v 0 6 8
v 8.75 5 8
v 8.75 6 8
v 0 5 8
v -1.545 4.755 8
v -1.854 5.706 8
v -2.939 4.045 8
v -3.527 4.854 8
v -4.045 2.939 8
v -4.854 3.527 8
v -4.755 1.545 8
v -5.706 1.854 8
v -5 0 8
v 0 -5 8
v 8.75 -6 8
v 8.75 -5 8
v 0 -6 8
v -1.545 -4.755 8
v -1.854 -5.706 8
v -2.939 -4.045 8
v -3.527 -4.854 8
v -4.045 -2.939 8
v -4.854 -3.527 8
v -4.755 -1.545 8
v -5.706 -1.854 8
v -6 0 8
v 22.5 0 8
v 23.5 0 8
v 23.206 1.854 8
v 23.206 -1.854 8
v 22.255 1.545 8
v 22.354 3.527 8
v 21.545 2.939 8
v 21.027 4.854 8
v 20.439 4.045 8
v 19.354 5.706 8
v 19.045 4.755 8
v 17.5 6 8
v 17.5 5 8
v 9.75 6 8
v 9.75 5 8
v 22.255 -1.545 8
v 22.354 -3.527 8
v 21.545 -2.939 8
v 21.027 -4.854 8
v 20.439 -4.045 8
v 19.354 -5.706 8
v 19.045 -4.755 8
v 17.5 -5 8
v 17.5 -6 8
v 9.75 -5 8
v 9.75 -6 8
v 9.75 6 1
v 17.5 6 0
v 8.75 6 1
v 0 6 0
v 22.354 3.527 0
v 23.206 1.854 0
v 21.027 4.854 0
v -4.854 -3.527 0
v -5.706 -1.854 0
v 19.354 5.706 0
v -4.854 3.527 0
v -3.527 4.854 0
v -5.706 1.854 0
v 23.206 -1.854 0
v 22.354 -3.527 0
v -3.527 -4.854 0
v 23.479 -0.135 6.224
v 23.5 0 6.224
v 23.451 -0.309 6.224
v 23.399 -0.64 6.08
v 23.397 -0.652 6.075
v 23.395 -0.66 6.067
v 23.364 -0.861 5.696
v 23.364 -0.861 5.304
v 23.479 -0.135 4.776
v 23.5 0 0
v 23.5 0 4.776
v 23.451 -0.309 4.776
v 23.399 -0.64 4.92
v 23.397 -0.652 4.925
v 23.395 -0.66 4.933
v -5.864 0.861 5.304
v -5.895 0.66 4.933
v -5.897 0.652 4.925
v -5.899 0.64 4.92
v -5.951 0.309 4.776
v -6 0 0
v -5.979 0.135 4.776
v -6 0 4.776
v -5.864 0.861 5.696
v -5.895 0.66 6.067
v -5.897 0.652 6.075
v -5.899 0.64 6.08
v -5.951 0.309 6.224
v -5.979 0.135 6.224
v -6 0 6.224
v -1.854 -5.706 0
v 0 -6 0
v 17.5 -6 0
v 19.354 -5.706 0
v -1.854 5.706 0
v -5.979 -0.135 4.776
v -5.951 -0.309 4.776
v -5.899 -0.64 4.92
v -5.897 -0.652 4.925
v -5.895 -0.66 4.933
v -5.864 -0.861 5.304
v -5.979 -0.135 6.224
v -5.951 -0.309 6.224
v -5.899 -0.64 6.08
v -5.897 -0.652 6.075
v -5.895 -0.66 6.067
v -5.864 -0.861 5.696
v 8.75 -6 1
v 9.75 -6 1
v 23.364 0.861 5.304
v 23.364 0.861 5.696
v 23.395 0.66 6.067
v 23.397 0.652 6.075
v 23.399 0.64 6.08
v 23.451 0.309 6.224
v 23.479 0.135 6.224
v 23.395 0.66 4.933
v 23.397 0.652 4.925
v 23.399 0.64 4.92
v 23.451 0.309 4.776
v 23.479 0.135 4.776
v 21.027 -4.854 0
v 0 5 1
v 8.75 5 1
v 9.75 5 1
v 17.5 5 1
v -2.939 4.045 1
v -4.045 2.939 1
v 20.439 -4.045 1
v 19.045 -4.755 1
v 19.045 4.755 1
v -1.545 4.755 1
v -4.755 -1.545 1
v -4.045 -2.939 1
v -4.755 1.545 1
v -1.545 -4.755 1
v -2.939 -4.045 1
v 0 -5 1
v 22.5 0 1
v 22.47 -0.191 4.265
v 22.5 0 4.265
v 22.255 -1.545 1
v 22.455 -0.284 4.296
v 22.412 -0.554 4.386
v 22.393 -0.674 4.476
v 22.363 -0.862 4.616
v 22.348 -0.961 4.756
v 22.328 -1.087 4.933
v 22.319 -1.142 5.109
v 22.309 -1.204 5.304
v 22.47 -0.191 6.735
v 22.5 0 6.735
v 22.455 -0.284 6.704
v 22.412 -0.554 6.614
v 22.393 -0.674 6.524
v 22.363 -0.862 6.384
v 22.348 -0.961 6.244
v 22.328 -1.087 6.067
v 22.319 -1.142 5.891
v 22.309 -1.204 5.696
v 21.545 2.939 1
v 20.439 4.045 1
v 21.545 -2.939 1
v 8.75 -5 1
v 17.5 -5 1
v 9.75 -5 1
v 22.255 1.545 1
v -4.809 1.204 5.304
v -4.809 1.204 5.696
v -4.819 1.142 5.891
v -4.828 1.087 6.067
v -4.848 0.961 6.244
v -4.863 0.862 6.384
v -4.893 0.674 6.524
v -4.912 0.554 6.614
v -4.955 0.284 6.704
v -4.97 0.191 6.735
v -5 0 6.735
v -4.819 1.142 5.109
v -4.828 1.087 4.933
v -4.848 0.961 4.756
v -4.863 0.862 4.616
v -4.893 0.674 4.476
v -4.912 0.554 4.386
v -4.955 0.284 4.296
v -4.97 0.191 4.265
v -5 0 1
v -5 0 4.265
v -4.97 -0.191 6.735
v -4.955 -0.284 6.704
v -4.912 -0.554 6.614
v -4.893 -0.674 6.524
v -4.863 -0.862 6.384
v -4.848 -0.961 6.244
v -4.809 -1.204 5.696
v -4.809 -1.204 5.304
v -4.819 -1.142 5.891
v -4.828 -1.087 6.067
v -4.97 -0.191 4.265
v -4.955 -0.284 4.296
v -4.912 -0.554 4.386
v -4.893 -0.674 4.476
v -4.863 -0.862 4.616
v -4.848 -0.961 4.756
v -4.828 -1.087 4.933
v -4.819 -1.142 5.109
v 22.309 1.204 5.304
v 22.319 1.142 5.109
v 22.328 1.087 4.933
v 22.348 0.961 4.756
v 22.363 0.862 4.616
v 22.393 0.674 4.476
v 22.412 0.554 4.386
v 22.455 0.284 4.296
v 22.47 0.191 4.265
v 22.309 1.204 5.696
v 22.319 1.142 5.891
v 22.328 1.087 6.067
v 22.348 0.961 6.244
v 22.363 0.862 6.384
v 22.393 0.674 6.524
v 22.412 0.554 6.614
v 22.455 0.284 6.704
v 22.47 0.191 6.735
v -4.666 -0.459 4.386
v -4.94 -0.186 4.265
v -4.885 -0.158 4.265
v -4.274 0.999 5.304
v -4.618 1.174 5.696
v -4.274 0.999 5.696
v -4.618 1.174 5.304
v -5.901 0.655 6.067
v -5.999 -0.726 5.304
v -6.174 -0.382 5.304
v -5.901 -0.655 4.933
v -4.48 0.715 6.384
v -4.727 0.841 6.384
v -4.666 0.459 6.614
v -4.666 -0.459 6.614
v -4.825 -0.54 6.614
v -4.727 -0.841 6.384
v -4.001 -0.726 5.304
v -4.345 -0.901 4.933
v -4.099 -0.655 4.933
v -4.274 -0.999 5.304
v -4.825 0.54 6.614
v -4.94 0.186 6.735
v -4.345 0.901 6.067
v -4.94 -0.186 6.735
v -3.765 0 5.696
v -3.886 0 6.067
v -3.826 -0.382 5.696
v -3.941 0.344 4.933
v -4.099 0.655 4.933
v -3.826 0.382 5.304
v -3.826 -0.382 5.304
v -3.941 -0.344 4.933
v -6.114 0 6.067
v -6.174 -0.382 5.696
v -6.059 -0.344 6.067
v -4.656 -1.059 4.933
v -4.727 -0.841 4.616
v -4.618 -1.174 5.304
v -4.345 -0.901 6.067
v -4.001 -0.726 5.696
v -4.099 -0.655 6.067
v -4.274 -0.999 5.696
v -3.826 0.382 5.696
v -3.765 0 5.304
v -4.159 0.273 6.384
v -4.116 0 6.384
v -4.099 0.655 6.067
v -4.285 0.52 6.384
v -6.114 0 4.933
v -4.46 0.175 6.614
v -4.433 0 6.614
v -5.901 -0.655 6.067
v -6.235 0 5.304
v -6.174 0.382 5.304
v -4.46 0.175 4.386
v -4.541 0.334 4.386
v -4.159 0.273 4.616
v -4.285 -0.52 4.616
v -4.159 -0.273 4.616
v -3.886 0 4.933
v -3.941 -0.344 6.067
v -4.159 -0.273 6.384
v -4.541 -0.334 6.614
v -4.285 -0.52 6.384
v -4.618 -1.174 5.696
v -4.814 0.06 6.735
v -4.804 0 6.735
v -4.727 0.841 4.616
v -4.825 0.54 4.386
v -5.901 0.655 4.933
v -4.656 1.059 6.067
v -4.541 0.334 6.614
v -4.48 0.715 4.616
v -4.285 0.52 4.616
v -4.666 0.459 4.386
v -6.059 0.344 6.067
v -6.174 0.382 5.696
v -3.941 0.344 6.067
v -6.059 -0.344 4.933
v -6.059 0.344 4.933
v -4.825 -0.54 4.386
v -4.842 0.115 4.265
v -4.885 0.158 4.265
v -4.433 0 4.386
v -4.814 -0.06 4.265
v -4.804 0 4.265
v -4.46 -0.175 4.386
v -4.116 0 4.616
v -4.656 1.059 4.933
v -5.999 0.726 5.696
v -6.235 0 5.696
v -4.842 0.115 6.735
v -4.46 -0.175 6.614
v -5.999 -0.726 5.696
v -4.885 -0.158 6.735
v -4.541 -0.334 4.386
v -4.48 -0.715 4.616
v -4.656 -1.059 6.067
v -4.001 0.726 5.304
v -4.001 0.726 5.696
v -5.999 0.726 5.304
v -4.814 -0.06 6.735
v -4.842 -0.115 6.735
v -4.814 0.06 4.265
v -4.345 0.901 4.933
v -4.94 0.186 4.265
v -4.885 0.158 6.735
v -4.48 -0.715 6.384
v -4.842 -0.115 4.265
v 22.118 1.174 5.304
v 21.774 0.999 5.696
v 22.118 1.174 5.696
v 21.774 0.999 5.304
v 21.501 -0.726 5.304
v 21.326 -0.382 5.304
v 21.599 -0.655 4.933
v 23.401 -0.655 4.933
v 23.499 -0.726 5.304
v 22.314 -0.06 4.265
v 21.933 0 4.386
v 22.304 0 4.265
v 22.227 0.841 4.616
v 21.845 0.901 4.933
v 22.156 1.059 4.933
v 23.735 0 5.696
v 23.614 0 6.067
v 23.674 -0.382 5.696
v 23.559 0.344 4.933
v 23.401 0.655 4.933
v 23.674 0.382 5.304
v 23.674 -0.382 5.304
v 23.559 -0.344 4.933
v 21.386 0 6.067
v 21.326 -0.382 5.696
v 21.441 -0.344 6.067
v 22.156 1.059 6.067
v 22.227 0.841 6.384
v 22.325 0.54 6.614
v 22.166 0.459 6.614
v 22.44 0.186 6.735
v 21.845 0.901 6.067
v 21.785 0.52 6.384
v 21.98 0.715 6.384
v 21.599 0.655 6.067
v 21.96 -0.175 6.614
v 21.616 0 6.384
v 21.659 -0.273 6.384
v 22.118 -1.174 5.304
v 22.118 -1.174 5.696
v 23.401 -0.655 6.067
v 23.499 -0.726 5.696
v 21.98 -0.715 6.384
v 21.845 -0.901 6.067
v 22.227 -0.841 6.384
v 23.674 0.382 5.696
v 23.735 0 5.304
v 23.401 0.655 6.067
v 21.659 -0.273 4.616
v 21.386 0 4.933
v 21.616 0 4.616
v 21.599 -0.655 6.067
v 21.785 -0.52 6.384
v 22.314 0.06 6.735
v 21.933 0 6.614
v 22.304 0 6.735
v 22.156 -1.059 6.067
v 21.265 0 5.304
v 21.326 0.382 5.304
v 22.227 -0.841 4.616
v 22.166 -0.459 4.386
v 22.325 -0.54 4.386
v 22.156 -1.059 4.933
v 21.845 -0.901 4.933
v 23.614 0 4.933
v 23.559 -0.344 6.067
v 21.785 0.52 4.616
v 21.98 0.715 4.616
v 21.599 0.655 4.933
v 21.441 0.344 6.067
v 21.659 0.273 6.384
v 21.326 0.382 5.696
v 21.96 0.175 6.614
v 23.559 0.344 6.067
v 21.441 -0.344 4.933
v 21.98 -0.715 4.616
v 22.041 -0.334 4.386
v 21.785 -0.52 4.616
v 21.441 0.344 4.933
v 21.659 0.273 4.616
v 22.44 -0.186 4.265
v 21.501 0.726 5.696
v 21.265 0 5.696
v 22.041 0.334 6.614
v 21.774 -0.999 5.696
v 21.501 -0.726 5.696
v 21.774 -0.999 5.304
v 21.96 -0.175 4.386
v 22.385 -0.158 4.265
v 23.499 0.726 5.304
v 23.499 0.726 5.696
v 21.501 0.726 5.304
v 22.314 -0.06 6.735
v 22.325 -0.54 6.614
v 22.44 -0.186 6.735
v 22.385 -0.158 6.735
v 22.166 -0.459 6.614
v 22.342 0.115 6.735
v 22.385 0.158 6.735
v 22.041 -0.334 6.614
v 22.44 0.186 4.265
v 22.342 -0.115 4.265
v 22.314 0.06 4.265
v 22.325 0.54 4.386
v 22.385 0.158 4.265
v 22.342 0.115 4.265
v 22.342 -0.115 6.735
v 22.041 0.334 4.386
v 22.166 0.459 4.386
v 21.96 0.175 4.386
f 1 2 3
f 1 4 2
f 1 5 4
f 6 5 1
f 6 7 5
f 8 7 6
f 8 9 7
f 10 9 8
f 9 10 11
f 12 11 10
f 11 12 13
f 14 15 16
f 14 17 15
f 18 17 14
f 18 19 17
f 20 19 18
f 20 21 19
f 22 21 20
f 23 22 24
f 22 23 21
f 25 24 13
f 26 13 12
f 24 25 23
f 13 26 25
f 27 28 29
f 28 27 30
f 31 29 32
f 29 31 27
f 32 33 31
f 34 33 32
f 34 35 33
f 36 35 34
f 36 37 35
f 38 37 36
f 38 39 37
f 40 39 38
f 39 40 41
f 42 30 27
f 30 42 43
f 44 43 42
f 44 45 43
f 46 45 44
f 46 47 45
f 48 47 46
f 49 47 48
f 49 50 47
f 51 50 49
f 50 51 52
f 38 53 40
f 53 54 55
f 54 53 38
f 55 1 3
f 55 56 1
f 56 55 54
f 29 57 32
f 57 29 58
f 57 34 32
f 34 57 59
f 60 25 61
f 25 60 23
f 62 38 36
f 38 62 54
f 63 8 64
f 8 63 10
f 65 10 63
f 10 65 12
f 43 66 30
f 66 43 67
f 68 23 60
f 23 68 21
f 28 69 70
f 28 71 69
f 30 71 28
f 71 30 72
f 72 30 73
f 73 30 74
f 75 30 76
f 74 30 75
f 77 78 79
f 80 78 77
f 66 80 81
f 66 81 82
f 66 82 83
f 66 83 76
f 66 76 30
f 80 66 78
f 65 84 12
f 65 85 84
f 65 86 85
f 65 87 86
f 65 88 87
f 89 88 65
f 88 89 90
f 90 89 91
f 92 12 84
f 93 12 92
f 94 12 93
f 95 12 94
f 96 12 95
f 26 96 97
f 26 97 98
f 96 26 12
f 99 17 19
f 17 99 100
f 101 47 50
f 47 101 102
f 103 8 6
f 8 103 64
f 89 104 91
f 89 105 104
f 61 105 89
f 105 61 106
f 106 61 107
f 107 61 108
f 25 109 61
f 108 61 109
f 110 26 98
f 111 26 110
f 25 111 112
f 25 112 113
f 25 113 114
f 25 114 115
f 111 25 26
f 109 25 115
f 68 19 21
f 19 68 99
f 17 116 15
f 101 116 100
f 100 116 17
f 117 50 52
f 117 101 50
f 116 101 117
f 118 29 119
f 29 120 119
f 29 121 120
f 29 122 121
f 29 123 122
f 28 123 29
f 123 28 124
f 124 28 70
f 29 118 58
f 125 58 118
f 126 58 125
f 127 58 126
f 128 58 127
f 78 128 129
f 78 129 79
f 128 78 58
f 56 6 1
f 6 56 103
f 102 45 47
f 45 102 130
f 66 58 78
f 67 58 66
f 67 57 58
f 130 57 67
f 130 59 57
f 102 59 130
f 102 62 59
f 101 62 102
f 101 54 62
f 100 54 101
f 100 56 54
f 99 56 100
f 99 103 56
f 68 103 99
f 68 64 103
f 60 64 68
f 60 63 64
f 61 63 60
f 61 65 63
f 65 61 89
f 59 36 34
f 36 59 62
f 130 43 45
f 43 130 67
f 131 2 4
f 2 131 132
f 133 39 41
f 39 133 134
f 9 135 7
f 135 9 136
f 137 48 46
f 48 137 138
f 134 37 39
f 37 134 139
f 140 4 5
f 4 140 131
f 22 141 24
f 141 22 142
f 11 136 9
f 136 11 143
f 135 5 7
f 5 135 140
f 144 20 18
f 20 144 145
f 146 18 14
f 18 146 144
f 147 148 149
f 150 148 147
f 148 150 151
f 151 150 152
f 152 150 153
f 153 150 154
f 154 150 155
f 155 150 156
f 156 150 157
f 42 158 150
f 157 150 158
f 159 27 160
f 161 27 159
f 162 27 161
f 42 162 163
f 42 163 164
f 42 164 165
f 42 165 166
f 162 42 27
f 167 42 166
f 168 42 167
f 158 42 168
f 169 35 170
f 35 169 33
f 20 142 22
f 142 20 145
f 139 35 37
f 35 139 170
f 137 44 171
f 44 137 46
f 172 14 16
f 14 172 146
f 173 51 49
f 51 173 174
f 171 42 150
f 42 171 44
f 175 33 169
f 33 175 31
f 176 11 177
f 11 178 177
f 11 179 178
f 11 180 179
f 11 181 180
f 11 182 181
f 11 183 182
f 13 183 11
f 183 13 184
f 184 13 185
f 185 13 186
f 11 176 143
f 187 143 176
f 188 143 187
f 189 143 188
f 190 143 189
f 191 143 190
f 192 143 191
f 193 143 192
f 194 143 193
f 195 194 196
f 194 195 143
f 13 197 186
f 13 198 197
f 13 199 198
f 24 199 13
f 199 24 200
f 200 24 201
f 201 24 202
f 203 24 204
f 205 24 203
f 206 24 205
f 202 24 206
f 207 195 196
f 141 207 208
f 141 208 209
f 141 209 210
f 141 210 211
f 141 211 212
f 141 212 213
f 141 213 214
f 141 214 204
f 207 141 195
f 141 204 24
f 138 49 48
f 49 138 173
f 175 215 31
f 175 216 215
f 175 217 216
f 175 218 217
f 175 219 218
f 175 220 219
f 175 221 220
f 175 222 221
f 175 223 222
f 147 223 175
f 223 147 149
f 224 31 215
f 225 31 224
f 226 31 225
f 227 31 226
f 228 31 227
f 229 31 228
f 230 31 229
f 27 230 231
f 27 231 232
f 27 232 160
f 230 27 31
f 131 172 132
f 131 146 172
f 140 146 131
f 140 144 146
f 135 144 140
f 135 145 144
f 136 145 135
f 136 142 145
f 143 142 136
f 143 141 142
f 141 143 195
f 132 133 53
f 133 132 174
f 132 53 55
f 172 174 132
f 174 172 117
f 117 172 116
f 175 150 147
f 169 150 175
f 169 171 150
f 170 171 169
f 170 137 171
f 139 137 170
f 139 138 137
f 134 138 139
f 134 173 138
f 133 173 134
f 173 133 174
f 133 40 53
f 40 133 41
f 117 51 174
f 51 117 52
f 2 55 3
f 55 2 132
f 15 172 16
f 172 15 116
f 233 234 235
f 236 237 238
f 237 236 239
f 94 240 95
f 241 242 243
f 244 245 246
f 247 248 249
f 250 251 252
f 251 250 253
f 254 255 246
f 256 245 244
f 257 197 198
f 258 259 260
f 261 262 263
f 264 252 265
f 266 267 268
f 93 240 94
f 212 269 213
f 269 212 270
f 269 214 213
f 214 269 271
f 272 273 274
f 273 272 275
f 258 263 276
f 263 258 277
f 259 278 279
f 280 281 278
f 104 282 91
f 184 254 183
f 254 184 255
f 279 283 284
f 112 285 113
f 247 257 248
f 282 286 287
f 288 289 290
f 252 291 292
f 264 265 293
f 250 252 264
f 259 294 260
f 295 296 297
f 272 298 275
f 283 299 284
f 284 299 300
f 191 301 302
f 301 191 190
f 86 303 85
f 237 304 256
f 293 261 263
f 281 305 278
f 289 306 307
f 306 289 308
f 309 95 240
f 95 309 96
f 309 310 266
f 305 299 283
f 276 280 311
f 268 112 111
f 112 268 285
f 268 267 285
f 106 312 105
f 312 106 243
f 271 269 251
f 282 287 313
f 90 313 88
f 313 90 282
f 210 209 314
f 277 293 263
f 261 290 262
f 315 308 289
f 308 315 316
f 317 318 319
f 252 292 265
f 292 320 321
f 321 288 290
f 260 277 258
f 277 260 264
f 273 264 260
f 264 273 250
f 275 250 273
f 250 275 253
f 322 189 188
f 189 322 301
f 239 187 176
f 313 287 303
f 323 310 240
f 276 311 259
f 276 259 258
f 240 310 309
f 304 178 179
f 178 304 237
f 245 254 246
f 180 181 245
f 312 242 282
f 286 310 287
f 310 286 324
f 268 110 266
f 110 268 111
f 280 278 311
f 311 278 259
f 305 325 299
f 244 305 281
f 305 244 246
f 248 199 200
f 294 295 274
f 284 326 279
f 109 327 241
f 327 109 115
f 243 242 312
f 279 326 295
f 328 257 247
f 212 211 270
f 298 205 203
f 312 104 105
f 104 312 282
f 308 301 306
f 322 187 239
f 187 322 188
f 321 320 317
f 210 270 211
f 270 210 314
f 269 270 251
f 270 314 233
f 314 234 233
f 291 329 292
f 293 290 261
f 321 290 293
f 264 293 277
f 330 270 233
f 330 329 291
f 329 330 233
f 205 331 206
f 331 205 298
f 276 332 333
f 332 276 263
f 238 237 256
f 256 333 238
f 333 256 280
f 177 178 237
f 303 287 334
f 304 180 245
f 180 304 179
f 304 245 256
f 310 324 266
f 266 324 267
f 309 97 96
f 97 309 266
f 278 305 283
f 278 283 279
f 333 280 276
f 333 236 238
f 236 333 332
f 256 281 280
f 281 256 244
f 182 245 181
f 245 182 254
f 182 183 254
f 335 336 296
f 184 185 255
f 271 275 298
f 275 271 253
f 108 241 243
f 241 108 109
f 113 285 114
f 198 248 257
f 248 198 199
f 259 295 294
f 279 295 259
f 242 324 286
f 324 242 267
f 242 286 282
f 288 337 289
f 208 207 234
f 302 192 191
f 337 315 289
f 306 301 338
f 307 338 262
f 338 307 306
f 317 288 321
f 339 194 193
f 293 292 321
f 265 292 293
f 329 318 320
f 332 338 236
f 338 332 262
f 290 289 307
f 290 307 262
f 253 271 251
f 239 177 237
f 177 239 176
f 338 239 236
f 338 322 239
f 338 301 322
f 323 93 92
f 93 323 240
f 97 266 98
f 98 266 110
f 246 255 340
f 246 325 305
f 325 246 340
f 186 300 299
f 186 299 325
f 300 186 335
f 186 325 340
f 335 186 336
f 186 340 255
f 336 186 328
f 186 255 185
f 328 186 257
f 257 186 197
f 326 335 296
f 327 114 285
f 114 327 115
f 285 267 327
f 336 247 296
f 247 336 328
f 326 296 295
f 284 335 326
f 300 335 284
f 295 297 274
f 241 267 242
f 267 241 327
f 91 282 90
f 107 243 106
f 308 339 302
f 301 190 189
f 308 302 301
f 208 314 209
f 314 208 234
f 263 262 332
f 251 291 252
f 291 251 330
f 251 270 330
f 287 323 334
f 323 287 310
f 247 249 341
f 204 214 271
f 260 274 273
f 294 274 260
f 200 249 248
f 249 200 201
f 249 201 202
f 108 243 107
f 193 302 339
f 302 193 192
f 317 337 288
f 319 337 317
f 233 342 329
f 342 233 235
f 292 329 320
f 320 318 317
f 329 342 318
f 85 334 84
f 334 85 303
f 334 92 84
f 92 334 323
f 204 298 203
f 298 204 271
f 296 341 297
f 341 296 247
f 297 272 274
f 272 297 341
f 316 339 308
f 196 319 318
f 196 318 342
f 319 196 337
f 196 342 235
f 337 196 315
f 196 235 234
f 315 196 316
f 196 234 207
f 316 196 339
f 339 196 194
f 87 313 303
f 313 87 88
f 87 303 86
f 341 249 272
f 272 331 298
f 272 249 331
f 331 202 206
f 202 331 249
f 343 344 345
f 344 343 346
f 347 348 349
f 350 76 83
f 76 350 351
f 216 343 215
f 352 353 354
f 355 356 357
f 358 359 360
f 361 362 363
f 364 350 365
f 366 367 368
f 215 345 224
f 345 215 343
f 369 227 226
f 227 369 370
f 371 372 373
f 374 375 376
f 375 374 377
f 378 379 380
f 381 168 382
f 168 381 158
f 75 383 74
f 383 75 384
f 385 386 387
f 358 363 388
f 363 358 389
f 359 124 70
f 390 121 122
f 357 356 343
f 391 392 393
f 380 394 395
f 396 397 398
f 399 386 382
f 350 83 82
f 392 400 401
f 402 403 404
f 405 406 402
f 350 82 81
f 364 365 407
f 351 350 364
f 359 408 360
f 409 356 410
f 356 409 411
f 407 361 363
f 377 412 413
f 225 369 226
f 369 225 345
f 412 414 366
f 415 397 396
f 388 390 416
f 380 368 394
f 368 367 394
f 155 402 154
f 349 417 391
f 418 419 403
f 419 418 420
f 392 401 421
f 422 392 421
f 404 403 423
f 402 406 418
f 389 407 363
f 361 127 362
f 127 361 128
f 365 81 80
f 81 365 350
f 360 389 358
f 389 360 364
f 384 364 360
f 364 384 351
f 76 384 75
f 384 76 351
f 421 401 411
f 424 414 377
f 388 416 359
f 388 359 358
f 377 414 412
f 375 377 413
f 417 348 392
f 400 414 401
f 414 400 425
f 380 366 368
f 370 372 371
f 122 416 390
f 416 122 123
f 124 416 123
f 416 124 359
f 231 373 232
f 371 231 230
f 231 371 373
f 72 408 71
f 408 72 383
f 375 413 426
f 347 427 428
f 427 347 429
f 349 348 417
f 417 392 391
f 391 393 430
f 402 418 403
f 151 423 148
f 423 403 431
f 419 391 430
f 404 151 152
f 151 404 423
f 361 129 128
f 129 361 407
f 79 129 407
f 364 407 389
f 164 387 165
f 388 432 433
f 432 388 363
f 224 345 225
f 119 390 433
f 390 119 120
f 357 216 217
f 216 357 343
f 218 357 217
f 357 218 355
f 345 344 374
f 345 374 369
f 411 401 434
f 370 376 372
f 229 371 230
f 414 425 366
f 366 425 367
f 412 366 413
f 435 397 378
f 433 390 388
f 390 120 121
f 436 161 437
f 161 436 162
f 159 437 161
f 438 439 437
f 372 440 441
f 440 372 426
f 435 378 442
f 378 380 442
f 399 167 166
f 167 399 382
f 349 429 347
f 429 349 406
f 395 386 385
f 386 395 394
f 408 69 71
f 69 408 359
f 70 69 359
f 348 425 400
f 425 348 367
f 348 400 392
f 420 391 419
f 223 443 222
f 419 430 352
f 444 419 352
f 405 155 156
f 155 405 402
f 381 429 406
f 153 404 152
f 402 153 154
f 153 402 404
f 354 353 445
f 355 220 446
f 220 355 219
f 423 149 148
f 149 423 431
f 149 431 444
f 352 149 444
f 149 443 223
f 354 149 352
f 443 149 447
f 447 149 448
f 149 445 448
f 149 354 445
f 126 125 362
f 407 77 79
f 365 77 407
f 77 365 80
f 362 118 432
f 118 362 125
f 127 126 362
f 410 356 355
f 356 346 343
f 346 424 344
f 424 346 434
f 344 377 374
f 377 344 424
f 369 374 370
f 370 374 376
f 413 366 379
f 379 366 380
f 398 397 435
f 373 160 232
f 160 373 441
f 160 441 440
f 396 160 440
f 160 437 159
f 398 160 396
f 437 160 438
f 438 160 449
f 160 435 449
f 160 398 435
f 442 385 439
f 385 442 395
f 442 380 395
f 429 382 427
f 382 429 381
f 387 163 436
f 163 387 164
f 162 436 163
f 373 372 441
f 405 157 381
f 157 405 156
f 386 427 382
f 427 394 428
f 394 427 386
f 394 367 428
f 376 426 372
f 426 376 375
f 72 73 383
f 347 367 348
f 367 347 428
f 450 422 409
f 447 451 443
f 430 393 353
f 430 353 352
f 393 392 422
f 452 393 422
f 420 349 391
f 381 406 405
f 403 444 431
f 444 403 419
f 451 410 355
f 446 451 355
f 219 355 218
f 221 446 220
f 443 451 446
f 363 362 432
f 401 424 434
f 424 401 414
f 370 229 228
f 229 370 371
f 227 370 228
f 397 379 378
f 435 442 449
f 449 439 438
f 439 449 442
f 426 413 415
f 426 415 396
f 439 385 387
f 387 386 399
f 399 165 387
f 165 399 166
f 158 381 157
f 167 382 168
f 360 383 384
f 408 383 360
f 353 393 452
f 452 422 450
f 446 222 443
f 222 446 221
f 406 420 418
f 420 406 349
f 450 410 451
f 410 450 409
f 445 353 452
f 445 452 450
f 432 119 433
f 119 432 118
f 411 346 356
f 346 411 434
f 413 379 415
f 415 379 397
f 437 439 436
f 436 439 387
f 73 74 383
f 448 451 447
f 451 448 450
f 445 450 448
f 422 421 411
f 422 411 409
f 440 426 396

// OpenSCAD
height=27.5;

width=10;

wall_thickness=1;

hole_distance=4.5;

hole_diameter=2.5;

$fn=20*1;


difference()
{
	hull()
		{
		cylinder(r=width/2+wall_thickness,h=hole_distance+wall_thickness+hole_diameter);
		translate([height-width,0,0])
		cylinder(r=width/2+wall_thickness,h=hole_distance+wall_thickness+hole_diameter);
		}
	translate([0,0,wall_thickness])	
	hull()
		{
		cylinder(r=width/2,h=hole_distance+hole_diameter+0.1);
		translate([height-width,0,0])
		cylinder(r=width/2,h=hole_distance+hole_diameter+0.1);
		}
	translate([(height-width)/2,-(width+wall_thickness*2+0.2)/2,+wall_thickness])
		cube([1,width+wall_thickness*2+0.2,hole_distance*2+0.1]);
}

translate([-width/2,0,hole_distance+wall_thickness])
sphere(r=hole_diameter/2);
translate([height-width/2,0,hole_distance+wall_thickness])
sphere(r=hole_diameter/2);
